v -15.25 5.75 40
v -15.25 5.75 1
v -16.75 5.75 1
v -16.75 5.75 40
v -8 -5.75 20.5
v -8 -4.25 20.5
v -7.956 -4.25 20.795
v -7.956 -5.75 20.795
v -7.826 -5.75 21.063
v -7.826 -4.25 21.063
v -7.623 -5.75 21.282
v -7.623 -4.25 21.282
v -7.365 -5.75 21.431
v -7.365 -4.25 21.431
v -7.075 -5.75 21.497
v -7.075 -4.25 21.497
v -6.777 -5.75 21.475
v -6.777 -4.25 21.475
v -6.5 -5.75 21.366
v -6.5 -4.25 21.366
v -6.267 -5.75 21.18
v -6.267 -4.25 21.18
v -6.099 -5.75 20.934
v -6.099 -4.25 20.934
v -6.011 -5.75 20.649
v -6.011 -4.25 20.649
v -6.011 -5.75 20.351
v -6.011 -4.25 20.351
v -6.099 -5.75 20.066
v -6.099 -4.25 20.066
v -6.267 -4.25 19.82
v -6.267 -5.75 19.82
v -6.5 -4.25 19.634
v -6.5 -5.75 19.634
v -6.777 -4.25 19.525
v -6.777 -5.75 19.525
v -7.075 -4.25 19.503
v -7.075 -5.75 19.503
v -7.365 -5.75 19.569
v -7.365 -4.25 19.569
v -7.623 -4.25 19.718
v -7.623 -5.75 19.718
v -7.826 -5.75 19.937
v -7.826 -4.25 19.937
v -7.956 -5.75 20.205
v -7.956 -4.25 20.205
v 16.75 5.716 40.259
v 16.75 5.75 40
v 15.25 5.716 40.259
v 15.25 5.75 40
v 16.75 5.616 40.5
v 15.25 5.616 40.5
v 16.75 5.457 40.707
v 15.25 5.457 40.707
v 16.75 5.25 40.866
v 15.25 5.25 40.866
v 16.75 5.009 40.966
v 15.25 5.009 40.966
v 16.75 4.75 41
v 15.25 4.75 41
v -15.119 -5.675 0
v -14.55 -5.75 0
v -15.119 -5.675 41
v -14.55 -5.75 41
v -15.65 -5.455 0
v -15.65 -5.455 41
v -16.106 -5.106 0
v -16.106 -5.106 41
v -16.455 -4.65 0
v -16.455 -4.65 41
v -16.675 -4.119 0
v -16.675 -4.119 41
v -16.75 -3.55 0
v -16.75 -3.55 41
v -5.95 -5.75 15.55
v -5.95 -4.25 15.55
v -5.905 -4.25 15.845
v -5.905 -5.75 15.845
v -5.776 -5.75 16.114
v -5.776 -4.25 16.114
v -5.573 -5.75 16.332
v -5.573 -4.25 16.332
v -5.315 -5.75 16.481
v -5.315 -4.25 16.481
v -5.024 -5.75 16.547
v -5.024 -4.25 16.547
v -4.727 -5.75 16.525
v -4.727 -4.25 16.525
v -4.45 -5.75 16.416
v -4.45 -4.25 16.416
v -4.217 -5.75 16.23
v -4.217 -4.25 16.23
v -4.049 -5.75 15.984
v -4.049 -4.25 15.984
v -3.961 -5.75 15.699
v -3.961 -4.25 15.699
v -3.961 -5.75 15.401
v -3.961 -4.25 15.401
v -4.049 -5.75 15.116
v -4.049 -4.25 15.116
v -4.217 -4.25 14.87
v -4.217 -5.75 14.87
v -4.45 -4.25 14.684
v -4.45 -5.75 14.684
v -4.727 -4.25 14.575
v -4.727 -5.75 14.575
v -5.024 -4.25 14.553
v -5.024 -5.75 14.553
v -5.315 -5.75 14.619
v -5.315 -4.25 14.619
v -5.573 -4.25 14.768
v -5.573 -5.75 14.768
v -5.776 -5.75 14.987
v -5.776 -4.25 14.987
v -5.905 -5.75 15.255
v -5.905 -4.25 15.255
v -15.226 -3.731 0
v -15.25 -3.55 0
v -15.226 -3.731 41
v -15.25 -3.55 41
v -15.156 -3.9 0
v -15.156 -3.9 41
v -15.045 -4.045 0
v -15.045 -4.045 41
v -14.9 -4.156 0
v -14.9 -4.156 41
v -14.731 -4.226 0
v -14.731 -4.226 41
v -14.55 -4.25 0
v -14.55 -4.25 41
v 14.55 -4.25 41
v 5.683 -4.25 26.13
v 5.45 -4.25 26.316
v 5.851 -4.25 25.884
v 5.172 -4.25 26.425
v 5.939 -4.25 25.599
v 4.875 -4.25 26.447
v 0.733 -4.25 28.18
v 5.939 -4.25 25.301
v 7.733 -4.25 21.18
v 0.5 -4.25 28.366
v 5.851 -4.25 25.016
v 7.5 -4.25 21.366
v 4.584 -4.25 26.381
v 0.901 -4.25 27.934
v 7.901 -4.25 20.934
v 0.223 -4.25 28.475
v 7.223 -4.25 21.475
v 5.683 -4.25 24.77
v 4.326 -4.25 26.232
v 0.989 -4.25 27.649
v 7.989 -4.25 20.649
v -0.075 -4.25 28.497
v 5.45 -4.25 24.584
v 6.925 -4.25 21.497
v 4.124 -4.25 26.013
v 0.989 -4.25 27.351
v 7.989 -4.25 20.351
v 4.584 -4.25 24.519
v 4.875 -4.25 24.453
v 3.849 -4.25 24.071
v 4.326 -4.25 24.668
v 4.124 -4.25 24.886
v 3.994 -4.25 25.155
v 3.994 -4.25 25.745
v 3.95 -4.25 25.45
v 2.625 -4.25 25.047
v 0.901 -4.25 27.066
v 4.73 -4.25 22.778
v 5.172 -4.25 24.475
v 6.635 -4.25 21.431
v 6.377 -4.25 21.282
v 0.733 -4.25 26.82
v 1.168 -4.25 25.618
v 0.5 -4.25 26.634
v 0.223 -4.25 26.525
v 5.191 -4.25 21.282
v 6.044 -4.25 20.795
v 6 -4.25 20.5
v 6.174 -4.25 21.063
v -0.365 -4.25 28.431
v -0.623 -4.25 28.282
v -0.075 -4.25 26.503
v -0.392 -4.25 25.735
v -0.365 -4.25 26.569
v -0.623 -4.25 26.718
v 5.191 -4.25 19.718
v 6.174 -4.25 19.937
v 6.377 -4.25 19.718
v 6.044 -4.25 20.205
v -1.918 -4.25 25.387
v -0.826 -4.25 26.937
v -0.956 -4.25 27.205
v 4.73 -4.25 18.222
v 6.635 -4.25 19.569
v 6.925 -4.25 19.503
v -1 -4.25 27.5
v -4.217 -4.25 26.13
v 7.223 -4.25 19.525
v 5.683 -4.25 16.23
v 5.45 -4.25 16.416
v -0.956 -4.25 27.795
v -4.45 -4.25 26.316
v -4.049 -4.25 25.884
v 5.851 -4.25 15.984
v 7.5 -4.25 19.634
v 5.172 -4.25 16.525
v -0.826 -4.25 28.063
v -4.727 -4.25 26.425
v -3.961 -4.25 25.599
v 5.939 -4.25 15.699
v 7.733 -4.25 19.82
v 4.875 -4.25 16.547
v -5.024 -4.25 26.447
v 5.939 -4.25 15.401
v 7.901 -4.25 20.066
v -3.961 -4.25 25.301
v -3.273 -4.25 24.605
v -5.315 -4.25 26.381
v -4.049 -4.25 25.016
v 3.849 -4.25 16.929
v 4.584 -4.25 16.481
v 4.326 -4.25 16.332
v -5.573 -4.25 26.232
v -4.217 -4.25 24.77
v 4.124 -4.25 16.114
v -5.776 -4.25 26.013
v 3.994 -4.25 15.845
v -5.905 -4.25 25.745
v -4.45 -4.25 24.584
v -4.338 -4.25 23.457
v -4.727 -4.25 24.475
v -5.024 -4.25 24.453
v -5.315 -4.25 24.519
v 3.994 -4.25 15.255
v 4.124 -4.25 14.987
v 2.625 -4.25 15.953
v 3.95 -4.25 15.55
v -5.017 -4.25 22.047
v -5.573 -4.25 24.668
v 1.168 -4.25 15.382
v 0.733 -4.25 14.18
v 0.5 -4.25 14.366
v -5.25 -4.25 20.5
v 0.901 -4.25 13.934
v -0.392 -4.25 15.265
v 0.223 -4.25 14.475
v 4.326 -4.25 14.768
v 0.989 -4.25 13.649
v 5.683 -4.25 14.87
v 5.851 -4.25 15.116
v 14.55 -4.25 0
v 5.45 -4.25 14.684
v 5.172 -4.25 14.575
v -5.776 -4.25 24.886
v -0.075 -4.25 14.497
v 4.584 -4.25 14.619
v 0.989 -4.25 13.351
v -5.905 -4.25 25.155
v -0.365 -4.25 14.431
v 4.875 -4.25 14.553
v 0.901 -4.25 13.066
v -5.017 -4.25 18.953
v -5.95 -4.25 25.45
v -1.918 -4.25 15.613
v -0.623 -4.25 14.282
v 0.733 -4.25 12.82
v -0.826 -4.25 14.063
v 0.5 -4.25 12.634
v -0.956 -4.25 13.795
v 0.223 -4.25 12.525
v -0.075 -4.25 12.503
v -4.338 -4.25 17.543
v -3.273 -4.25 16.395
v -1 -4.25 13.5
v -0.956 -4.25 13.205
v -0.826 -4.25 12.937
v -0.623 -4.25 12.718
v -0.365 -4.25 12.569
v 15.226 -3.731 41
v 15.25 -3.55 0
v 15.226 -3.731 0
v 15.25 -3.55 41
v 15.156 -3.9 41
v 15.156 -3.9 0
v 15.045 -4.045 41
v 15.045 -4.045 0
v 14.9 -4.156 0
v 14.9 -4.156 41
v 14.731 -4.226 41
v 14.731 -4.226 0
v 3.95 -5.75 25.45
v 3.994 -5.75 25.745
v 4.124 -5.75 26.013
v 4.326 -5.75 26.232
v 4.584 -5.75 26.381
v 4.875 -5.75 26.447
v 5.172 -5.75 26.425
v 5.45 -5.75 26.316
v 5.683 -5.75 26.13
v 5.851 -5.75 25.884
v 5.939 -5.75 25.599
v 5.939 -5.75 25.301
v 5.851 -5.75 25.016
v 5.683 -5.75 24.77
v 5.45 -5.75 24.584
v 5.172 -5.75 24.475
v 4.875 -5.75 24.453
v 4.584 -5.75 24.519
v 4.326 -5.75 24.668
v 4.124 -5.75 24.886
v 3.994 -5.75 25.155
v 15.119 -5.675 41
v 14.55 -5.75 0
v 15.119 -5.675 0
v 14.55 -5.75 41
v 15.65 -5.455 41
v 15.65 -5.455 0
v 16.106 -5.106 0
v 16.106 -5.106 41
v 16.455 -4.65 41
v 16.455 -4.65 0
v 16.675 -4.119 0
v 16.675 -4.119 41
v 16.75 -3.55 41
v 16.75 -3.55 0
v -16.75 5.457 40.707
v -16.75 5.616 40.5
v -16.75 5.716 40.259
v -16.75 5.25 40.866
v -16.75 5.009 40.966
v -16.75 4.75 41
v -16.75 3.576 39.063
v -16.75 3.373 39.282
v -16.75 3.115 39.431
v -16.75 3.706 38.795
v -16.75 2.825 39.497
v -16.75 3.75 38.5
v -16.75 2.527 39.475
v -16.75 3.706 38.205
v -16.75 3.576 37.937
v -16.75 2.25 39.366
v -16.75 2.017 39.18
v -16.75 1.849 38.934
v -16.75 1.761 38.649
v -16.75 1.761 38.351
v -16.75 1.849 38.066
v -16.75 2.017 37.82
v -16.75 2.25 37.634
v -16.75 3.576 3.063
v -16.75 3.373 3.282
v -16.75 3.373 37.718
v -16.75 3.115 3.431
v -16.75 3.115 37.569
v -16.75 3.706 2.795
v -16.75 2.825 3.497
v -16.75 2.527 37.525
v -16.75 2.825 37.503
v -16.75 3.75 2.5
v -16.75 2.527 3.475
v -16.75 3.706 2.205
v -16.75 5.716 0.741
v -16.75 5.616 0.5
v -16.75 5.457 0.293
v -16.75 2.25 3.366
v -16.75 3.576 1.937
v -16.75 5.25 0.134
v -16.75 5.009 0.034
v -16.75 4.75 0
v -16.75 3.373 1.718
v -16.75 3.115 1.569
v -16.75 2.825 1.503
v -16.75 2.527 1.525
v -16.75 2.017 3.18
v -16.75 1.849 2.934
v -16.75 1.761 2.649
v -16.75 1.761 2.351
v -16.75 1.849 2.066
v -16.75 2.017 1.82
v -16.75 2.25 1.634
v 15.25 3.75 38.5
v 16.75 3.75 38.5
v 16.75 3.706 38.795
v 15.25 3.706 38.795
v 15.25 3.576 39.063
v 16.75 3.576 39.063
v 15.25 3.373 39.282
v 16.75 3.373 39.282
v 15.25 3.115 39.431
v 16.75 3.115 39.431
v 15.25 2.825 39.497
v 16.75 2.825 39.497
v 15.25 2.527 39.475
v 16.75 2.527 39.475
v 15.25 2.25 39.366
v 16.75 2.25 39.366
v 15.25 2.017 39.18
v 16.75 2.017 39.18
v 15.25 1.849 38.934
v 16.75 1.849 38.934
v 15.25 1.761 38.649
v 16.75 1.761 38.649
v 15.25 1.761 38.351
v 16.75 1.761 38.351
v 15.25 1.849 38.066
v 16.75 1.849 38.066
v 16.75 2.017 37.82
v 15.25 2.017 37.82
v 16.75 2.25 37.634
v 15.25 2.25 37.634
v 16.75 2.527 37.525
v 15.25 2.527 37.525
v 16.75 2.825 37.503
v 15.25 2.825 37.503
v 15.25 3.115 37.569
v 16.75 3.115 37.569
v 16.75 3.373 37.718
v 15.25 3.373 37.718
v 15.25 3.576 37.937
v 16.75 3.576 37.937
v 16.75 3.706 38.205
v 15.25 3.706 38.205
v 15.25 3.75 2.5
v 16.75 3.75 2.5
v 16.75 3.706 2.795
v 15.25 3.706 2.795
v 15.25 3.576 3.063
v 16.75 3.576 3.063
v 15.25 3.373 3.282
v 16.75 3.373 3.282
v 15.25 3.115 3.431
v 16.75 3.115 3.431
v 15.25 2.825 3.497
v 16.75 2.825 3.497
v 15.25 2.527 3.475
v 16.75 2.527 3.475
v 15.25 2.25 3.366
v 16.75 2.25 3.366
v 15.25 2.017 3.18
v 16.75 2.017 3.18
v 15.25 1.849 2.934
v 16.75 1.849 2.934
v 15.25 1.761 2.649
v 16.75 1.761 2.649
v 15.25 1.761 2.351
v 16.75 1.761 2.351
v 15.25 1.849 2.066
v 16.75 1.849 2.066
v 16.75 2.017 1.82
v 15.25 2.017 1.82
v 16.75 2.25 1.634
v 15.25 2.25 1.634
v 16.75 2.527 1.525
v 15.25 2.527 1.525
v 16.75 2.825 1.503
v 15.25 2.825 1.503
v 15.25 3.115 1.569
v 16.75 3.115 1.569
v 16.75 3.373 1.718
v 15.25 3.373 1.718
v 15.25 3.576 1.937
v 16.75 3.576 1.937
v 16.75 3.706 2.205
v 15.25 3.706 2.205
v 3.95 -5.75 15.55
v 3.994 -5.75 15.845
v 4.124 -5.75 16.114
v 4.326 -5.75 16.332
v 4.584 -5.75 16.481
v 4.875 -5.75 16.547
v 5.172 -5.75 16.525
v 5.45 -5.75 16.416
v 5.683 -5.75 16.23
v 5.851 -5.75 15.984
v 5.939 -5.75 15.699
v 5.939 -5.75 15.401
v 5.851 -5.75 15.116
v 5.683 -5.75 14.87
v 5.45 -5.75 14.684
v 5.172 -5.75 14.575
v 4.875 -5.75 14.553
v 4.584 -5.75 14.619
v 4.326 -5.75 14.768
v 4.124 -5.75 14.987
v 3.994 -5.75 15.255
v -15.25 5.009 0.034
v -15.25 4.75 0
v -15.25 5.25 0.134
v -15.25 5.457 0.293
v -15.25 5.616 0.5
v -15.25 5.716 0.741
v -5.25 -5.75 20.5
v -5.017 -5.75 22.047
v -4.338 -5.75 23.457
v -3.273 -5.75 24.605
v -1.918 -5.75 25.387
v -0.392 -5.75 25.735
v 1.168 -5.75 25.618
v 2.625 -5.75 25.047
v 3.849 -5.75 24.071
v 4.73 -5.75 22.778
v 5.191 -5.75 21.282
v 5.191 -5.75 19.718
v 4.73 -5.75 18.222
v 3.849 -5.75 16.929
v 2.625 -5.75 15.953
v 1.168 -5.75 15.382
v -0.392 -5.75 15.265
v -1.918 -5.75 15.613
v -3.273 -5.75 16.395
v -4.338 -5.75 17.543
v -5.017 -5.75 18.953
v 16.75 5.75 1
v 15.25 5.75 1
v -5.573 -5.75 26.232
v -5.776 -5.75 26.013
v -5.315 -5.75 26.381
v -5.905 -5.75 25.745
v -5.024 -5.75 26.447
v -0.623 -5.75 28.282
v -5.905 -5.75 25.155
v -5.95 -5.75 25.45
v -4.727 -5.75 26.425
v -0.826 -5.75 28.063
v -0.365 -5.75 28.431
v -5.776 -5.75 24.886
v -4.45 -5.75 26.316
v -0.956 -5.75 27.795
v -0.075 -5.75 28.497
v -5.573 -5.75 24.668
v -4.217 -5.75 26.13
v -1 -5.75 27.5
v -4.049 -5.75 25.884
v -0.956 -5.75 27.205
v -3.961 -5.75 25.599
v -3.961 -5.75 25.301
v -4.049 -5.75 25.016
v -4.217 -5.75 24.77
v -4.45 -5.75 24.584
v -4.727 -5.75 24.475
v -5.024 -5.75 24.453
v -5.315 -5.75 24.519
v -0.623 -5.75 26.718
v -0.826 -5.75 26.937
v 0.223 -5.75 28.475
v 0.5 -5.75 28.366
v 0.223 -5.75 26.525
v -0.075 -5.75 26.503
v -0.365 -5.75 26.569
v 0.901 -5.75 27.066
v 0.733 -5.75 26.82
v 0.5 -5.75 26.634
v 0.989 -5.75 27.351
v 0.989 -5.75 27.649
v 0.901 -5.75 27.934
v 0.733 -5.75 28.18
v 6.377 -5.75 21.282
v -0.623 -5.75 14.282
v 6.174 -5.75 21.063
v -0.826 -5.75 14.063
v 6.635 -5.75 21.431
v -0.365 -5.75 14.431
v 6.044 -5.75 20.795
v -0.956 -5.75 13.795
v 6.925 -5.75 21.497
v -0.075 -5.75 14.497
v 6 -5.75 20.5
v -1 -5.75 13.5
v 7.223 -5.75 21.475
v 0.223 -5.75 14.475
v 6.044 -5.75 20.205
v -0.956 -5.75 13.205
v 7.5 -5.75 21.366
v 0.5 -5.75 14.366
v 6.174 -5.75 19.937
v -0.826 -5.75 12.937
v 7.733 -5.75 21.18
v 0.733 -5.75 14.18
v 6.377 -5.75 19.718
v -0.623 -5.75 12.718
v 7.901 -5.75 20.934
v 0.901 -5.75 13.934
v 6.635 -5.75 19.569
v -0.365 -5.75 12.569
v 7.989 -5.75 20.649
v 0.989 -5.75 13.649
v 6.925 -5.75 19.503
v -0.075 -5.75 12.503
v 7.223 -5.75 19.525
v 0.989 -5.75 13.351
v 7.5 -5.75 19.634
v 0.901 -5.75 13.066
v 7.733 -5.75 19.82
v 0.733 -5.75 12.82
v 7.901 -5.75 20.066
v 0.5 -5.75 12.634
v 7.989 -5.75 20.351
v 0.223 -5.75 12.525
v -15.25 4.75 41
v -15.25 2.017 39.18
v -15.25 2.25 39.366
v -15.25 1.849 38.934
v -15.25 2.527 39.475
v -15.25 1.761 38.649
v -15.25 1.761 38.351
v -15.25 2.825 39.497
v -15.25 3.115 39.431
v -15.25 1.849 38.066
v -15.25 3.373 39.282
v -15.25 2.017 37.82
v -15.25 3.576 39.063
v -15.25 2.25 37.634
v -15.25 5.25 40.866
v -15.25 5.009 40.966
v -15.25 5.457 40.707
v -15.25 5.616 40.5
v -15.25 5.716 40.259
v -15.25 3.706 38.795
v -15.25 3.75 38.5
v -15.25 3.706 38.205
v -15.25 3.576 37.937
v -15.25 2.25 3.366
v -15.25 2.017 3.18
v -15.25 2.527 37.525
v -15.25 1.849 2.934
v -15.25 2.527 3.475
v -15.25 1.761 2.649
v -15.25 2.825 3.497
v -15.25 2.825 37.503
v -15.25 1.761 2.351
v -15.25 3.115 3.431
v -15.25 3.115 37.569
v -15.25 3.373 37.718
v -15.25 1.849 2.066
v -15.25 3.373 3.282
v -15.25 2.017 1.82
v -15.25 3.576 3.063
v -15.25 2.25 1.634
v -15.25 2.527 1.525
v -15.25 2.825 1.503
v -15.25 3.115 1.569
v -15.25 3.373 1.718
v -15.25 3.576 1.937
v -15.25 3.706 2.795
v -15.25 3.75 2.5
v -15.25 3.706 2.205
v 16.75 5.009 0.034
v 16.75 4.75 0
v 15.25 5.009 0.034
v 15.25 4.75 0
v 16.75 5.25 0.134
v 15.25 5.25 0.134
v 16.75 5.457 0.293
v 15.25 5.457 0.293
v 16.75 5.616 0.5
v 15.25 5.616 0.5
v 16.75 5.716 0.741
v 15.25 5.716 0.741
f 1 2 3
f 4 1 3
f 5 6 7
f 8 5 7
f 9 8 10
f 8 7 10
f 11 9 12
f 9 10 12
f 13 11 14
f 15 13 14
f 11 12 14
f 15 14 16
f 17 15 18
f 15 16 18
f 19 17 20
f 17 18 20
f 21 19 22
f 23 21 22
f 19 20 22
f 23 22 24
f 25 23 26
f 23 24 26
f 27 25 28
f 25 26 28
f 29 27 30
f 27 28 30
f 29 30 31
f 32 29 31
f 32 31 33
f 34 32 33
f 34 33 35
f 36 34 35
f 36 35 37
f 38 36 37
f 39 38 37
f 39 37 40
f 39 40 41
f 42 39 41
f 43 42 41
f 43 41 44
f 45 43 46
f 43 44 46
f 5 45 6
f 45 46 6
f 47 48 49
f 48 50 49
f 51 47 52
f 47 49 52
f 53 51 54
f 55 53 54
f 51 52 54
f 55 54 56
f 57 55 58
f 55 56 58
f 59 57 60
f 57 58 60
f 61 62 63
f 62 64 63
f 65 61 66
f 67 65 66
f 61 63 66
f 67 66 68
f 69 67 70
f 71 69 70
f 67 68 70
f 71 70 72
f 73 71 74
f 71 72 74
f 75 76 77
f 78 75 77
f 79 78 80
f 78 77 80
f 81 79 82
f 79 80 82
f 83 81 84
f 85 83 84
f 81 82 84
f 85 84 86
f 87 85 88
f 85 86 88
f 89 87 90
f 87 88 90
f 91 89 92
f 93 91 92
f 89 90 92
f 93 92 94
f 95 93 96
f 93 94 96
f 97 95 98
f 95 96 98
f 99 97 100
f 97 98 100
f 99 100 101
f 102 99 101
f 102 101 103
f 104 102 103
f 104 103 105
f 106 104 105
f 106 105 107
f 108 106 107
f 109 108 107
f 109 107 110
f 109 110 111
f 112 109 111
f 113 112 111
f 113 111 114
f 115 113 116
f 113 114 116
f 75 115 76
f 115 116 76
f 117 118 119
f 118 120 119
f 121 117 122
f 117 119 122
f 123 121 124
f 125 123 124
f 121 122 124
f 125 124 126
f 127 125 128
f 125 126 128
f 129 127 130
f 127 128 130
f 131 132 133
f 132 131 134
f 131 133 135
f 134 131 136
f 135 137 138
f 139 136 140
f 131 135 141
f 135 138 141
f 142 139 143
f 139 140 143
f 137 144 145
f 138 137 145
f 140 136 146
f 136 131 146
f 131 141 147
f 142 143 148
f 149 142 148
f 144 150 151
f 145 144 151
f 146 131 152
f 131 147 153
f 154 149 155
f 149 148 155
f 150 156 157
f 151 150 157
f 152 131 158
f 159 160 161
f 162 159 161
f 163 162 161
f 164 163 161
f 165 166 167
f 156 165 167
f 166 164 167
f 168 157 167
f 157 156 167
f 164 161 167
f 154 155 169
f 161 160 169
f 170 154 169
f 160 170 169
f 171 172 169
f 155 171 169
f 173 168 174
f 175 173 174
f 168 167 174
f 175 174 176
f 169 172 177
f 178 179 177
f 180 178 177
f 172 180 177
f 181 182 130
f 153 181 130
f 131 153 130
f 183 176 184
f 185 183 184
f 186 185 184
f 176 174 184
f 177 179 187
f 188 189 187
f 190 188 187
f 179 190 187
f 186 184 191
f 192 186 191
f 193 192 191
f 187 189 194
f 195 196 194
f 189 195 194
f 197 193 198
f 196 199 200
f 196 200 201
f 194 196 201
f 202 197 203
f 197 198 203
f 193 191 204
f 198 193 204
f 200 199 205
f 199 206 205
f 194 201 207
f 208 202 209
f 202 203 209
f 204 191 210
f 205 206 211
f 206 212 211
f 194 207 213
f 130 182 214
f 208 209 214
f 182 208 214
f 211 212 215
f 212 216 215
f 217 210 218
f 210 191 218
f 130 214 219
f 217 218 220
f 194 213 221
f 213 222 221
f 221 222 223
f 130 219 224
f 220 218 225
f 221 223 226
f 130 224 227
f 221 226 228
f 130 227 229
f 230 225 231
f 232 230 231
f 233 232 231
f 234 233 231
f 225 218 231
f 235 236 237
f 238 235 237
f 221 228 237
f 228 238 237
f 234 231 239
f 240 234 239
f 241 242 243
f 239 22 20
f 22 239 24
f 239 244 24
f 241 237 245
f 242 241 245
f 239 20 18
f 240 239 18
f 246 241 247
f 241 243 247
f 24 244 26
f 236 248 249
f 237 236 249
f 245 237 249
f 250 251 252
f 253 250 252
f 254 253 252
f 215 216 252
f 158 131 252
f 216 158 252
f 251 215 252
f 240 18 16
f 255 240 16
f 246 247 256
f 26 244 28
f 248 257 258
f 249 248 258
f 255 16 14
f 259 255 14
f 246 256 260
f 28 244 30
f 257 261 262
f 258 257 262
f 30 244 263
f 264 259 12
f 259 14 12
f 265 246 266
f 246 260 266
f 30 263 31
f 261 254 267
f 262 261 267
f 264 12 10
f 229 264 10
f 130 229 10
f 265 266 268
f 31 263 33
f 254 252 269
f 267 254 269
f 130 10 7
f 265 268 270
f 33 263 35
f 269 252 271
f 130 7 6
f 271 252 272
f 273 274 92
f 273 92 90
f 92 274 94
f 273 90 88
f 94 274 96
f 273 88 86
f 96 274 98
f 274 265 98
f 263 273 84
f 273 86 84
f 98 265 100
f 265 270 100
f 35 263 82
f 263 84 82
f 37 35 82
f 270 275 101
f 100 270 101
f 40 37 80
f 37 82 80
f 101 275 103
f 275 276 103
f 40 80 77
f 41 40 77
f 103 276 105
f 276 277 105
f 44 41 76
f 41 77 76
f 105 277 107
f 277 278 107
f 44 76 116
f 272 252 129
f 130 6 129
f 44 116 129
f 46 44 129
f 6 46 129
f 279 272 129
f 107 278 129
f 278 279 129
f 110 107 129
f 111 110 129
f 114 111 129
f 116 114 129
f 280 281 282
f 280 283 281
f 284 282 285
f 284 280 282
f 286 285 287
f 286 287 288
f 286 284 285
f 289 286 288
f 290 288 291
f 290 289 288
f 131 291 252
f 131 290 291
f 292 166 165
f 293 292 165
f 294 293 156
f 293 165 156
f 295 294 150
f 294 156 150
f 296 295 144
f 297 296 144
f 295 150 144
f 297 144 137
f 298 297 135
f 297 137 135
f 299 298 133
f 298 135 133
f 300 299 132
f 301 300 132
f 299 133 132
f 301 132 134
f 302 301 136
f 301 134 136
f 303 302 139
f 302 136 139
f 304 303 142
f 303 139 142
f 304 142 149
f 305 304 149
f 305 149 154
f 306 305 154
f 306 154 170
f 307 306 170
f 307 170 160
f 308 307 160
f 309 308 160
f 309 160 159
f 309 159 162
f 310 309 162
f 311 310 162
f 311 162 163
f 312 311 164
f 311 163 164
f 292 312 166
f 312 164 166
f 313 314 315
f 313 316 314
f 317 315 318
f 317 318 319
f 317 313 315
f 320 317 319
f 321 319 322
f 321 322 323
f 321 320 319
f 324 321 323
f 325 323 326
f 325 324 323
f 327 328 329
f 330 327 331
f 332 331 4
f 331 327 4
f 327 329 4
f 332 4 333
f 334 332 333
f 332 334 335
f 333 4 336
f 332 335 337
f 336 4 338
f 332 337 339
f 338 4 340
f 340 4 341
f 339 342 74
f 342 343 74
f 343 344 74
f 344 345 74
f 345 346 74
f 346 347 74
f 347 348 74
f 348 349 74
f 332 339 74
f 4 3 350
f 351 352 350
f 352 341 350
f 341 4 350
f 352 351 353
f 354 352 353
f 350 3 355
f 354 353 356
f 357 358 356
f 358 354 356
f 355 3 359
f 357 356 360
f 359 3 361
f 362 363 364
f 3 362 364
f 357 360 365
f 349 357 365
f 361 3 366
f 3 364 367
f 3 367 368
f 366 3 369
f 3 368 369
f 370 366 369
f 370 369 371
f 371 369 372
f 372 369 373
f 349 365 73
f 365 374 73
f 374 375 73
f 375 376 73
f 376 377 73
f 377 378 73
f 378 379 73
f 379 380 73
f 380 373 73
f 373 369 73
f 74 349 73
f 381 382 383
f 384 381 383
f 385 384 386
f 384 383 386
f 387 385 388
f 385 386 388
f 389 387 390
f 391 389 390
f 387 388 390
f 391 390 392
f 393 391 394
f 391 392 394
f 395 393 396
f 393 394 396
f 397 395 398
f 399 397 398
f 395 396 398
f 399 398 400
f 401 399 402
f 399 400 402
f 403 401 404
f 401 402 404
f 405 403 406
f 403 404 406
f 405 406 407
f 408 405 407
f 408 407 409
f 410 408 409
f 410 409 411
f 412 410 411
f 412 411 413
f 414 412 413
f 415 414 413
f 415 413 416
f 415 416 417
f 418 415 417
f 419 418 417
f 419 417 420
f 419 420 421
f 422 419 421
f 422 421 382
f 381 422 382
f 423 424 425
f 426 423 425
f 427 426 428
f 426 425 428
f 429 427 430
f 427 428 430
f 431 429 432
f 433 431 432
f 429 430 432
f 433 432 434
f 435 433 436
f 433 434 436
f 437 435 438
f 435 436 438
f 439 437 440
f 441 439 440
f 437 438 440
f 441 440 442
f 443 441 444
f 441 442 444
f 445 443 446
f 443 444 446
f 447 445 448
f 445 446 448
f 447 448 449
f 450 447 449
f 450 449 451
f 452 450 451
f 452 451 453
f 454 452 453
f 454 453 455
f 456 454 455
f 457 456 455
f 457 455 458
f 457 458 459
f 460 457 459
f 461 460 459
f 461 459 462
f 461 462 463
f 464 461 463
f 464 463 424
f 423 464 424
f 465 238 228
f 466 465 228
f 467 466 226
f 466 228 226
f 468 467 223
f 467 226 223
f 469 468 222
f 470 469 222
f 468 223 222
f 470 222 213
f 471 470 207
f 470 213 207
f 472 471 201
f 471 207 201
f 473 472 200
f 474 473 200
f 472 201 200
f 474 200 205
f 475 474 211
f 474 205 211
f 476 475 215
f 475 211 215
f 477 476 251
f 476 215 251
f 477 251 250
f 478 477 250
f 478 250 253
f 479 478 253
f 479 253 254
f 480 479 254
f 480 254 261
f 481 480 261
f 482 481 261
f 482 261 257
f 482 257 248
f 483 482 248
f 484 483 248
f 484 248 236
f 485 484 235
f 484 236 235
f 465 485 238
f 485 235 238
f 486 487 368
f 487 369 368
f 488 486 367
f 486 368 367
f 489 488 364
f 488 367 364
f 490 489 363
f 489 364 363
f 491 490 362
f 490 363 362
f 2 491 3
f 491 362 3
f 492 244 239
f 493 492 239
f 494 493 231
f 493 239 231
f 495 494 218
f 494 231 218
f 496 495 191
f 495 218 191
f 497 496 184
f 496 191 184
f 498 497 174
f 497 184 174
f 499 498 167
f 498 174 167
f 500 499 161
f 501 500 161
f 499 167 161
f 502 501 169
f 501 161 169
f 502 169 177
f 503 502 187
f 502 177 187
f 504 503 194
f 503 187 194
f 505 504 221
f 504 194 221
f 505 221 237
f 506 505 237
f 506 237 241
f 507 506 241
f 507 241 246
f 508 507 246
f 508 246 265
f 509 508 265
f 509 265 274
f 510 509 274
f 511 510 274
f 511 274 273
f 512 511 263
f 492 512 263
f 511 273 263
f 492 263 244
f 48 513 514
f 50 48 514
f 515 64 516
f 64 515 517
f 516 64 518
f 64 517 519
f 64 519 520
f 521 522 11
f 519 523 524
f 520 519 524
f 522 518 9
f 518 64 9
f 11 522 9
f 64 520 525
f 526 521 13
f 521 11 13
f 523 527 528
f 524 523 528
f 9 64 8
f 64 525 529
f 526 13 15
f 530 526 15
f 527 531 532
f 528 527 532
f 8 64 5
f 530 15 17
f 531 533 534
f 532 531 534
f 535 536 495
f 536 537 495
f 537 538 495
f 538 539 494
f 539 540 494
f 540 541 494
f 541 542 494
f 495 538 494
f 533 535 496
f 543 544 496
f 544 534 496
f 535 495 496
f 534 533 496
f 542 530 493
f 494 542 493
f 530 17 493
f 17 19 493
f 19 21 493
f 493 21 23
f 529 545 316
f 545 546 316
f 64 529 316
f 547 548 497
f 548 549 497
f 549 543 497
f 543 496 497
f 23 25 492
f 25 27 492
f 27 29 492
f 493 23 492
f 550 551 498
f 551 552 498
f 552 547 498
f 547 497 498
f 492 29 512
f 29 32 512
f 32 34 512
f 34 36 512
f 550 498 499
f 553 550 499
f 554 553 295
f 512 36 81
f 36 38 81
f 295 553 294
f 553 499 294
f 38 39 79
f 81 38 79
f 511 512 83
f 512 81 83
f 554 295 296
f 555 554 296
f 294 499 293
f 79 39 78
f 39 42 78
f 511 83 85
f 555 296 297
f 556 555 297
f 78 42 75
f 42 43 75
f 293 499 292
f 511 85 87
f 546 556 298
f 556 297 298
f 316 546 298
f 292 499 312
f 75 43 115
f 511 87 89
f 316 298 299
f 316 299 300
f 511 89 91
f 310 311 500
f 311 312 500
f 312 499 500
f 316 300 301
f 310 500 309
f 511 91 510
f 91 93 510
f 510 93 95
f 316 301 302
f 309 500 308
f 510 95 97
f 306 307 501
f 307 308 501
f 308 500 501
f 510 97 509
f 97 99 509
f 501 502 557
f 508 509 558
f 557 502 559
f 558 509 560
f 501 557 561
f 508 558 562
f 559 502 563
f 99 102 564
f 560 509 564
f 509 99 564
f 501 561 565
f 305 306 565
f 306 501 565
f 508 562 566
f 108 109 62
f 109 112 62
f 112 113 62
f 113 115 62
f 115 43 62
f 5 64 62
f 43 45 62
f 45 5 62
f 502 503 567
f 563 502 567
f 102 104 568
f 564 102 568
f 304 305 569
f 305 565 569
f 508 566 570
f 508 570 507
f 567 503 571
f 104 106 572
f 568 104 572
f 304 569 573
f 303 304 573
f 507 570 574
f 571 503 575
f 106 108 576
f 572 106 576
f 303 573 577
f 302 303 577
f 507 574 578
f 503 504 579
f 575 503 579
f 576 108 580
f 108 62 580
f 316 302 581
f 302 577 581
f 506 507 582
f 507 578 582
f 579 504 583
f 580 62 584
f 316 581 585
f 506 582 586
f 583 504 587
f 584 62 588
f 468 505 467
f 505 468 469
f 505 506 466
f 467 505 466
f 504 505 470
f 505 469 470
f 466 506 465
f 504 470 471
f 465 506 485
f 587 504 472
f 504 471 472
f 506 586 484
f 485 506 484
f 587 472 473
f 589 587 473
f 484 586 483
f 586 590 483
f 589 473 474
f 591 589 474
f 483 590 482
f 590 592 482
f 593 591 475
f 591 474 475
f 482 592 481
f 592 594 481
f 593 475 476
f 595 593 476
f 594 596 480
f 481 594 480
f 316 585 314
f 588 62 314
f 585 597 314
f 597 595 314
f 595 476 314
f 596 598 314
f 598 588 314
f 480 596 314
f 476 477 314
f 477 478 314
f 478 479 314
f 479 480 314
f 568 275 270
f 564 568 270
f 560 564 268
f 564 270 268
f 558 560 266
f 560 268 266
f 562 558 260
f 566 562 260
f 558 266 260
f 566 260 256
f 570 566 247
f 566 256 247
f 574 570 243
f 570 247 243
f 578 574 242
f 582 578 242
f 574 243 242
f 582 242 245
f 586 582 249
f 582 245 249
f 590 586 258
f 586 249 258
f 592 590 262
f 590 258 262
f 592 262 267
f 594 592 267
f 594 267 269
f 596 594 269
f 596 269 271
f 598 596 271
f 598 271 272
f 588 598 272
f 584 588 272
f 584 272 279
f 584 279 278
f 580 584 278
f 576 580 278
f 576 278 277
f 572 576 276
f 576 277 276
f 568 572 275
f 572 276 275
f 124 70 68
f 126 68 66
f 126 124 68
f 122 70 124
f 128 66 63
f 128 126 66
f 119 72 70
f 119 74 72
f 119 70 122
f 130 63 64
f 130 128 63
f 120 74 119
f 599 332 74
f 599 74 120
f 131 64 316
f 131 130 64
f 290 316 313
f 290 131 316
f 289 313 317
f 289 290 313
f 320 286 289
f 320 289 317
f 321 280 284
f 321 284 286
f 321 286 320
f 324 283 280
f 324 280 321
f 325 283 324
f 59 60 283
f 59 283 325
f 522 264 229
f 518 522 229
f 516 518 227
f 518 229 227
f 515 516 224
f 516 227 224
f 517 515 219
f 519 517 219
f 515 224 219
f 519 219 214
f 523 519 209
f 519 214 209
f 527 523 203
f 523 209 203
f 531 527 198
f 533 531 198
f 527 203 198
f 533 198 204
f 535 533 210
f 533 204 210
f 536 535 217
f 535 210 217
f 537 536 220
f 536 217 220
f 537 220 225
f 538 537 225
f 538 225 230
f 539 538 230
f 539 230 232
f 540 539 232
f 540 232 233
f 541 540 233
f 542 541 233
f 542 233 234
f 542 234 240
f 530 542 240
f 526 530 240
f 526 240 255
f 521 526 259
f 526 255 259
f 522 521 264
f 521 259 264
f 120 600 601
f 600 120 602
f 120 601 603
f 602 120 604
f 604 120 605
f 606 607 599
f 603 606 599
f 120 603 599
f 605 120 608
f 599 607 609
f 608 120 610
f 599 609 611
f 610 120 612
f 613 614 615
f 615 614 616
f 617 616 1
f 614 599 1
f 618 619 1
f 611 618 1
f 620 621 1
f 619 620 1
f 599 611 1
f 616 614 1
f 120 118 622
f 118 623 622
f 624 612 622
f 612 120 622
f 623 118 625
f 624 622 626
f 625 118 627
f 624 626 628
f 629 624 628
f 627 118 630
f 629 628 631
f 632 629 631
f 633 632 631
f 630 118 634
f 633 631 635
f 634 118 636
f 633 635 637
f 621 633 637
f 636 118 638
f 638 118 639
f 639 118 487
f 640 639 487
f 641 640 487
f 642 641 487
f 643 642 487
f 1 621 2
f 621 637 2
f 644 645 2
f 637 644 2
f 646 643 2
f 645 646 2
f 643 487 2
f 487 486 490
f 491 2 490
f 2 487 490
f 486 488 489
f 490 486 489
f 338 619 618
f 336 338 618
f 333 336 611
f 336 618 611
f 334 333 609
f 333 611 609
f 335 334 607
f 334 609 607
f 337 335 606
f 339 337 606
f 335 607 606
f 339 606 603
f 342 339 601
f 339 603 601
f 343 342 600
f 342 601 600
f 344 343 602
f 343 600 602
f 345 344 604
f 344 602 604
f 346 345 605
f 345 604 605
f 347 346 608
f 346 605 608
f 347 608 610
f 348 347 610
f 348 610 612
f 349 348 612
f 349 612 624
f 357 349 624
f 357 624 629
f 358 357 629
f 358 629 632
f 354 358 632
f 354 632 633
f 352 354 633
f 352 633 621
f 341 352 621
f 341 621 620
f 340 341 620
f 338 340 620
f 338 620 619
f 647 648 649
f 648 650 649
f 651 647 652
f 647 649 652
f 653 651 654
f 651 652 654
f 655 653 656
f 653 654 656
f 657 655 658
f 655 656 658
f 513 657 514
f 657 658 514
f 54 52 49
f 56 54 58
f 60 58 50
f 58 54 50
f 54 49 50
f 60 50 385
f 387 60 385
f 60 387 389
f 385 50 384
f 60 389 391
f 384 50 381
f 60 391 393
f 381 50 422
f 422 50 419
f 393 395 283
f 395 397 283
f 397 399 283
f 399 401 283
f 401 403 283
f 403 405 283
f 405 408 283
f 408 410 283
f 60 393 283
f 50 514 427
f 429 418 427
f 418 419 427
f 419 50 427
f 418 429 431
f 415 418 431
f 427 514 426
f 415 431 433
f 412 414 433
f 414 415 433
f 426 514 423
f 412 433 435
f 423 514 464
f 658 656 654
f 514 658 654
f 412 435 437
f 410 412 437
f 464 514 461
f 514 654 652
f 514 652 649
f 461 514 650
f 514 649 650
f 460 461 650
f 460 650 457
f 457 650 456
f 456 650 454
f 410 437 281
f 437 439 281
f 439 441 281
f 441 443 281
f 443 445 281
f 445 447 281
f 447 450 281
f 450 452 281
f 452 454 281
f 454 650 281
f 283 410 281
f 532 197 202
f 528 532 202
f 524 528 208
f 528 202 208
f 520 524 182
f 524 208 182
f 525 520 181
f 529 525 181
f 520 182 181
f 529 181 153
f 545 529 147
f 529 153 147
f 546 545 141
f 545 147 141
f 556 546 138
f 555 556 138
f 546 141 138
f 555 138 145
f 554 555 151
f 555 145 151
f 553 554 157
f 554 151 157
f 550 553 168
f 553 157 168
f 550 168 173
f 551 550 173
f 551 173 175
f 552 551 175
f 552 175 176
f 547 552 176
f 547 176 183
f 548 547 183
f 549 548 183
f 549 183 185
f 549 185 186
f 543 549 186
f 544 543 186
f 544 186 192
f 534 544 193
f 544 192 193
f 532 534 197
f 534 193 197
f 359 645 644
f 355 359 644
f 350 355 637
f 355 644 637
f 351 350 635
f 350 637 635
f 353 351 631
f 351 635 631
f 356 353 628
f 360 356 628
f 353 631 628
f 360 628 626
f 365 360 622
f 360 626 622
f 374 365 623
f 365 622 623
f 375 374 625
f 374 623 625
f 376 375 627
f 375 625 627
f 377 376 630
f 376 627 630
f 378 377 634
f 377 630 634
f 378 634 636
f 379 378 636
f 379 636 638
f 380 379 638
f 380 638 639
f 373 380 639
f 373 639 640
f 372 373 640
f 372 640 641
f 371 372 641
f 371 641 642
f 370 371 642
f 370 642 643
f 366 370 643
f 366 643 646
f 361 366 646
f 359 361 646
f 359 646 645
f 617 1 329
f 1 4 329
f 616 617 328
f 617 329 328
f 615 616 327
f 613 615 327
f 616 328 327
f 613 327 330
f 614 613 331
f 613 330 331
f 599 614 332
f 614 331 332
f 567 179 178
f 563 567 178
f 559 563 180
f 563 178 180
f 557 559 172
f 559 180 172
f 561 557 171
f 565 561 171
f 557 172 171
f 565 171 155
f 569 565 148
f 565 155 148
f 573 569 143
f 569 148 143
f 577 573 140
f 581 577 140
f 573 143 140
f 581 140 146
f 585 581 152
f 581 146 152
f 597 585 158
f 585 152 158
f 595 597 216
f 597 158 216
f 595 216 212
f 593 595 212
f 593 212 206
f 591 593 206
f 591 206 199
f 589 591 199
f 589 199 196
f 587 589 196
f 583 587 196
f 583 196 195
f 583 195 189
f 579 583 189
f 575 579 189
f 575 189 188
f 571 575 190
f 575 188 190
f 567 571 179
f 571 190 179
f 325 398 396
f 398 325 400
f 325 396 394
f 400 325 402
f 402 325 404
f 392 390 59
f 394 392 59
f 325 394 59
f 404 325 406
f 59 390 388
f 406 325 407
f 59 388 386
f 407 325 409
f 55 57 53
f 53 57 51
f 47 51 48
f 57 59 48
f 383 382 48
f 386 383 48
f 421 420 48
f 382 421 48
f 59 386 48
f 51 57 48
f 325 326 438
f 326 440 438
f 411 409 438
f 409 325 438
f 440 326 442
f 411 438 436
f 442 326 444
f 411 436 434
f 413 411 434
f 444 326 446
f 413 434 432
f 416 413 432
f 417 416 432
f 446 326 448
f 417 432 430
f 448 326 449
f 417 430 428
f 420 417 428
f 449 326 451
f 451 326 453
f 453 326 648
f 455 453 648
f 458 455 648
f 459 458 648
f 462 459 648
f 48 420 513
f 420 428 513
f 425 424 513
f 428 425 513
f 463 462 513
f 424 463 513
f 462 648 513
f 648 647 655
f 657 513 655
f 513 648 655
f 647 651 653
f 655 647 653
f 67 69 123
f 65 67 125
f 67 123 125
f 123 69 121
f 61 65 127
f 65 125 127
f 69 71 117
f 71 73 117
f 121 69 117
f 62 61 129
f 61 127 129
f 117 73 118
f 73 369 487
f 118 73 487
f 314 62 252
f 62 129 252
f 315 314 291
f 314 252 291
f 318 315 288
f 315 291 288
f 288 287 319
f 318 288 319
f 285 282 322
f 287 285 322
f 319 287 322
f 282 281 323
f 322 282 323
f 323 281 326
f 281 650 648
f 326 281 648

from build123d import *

# Parameters (mm, degrees)
F1_DEPTH = 41
F2_R     = 2.2
F3_R     = 0.7
F4_R     = 1
F5_DEPTH = 33.501
F6_R     = 1
F7_R     = 5.25
F7_R_2   = 1
F8_DEPTH = 1.5


with BuildPart() as f1:
    # F0 (on Top) → F1 (new body)
    with BuildSketch(Plane.XY):
        Polygon((-16.75, -5.75), (16.75, -5.75), (16.75, 5.75), (15.25, 5.75), (15.25, -4.25), (-15.25, -4.25), (-15.25, 5.75), (-16.75, 5.75), align=None)
    extrude(amount=F1_DEPTH)

    # F2
    f2_edges = [f1.edges().sort_by_distance(p)[0] for p in [
        (16.75, -5.75, 20.5),
        (-16.75, -5.75, 20.5),
    ]]
    fillet(f2_edges, radius=F2_R)

    # F3
    f3_edges = [f1.edges().sort_by_distance(p)[0] for p in [
        (-15.25, -4.25, 20.5),
        (15.25, -4.25, 20.5),
    ]]
    fillet(f3_edges, radius=F3_R)

    # F4 (on face) → F5 (cut, through all)
    with BuildSketch(Plane.YZ.offset(16.75)):
        with Locations((2.75, 38.5)):
            Circle(F4_R)
        with Locations((2.75, 2.5)):
            Circle(F4_R)
    extrude(amount=-F5_DEPTH, mode=Mode.SUBTRACT)

    # F6
    f6_edges = [f1.edges().sort_by_distance(p)[0] for p in [
        (-16, 5.75, 41),
        (16, 5.75, 41),
        (-16, 5.75, 0),
        (16, 5.75, 0),
    ]]
    fillet(f6_edges, radius=F6_R)

    # F7 (on face) → F8 (cut, through all)
    with BuildSketch(Plane(origin=(0, -4.25, 0), x_dir=(-1, 0, 0), z_dir=(0, 1, 0))):
        with Locations((0, 20.5)):
            Circle(F7_R)
        with Locations((0, 27.5)):
            Circle(F7_R_2)
        with Locations((-4.949747, 25.449747)):
            Circle(F7_R_2)
        with Locations((-7, 20.5)):
            Circle(F7_R_2)
        with Locations((-4.949747, 15.550253)):
            Circle(F7_R_2)
        with Locations((0, 13.5)):
            Circle(F7_R_2)
        with Locations((4.949747, 15.550253)):
            Circle(F7_R_2)
        with Locations((7, 20.5)):
            Circle(F7_R_2)
        with Locations((4.949747, 25.449747)):
            Circle(F7_R_2)
    extrude(amount=-F8_DEPTH, mode=Mode.SUBTRACT)


solid = f1.part
